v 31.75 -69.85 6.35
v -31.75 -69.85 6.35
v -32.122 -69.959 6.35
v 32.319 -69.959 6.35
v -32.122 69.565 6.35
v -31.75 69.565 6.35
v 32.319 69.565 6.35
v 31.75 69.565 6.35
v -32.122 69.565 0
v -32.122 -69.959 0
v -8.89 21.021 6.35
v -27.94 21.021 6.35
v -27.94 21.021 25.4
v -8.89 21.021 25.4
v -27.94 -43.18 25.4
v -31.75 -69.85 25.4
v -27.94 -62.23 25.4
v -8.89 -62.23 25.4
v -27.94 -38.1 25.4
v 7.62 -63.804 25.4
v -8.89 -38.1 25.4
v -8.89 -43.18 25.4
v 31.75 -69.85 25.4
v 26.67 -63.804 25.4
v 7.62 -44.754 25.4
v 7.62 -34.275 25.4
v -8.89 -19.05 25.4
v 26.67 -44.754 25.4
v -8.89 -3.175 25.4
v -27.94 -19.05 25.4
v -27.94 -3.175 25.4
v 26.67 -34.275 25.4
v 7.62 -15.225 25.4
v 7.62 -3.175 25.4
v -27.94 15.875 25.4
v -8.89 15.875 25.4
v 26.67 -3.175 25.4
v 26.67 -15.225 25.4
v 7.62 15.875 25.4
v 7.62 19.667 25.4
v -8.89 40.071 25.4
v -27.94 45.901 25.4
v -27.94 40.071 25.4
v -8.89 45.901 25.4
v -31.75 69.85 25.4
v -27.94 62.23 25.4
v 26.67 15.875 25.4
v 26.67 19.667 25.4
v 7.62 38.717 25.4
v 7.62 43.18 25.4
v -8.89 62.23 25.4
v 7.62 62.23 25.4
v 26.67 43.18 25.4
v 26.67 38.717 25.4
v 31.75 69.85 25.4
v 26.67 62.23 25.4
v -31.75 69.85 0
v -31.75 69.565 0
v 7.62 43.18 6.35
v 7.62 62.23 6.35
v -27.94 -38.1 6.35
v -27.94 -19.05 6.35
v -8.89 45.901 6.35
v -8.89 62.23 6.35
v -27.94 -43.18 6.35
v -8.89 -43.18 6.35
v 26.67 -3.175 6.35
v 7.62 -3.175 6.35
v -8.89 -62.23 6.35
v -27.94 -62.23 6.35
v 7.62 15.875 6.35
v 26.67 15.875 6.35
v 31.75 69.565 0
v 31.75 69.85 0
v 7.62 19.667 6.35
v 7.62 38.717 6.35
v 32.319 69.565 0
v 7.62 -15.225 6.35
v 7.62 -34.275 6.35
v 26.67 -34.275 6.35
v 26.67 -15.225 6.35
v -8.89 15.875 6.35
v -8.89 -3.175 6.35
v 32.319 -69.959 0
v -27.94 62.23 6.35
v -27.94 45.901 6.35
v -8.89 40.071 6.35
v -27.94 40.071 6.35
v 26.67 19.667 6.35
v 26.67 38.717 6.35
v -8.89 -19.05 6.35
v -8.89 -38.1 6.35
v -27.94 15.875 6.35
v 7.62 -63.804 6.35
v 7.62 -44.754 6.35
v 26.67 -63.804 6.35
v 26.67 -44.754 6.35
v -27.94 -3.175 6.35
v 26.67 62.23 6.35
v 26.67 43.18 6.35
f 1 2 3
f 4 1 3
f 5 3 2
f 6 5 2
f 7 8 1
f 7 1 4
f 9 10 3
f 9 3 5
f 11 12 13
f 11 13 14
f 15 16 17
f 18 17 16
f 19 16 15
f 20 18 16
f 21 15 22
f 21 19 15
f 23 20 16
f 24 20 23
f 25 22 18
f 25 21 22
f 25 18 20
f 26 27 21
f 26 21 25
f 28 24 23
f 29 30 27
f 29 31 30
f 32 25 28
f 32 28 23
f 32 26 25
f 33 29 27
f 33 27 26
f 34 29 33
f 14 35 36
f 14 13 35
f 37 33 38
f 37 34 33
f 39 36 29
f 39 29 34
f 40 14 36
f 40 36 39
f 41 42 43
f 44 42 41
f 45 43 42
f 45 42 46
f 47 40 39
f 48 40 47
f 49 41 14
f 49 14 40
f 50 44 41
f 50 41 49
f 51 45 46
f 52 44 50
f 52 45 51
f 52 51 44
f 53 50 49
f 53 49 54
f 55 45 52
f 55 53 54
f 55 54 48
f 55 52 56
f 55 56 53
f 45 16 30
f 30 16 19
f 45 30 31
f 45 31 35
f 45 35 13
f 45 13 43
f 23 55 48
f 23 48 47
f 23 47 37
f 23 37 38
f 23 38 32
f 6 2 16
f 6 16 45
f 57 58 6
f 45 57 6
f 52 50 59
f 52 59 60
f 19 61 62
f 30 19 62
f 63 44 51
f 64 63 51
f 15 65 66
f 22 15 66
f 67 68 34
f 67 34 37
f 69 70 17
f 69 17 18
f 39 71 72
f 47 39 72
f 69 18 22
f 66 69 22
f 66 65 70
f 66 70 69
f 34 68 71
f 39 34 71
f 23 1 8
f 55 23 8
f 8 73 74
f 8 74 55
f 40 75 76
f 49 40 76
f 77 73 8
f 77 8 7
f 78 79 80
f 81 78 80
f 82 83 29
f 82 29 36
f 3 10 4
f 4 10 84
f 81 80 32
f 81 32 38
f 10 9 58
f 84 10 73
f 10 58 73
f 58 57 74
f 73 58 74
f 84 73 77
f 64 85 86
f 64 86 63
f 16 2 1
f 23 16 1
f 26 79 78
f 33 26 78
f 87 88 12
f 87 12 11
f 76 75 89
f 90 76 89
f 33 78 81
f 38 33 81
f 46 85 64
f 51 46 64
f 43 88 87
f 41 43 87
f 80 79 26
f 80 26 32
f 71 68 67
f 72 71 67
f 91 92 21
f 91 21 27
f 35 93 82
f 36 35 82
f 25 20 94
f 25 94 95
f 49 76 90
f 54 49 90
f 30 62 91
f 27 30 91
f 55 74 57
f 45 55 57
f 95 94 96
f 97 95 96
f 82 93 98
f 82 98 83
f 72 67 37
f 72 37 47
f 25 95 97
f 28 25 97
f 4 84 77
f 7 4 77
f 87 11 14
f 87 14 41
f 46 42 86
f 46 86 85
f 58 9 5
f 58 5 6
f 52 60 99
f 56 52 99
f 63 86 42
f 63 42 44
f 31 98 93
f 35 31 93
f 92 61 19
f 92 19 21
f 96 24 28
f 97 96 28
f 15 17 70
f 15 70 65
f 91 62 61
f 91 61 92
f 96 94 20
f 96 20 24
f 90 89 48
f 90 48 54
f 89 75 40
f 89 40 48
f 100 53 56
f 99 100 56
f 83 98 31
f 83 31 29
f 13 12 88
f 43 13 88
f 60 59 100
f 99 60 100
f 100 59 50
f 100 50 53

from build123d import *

# Parameters (mm, degrees)
F0_W     = 27.94
F0_H     = 139.7
F0_W_2   = 19.05
F0_H_2   = 19.05
F0_H_3   = 16.3293534029
F0_W_3   = 7.62
F1_DEPTH = 25.4
F2_W     = 64.4415542483
F2_H     = 139.5248323679
F3_DEPTH = 6.35


with BuildPart() as f1:
    # F0 (on Top) → F1 (new body)
    with BuildSketch(Plane.XY):
        with Locations((-17.78, 0)):
            Rectangle(F0_W, F0_H)
        with Locations((-18.415, -52.705)):
            Rectangle(F0_W_2, F0_H_2, mode=Mode.SUBTRACT)
        with Locations((-18.415, -28.575)):
            Rectangle(F0_W_2, F0_H_2, mode=Mode.SUBTRACT)
        with Locations((-18.415, 6.35)):
            Rectangle(F0_W_2, F0_H_2, mode=Mode.SUBTRACT)
        with Locations((-18.415, 30.5456899792)):
            Rectangle(F0_W_2, F0_H_2, mode=Mode.SUBTRACT)
        with Locations((-18.415, 54.0653232986)):
            Rectangle(F0_W_2, F0_H_3, mode=Mode.SUBTRACT)
        Rectangle(F0_W_3, F0_H)
        with Locations((17.78, 0)):
            Rectangle(F0_W, F0_H)
        with Locations((17.145, -54.2791421771)):
            Rectangle(F0_W_2, F0_H_2, mode=Mode.SUBTRACT)
        with Locations((17.145, -24.7503119767)):
            Rectangle(F0_W_2, F0_H_2, mode=Mode.SUBTRACT)
        with Locations((17.145, 6.35)):
            Rectangle(F0_W_2, F0_H_2, mode=Mode.SUBTRACT)
        with Locations((17.145, 29.1921038866)):
            Rectangle(F0_W_2, F0_H_2, mode=Mode.SUBTRACT)
        with Locations((17.145, 52.705)):
            Rectangle(F0_W_2, F0_H_2, mode=Mode.SUBTRACT)
    extrude(amount=F1_DEPTH)

    # F2 (on Top) → F3 (join)
    with BuildSketch(Plane.XY):
        with Locations((0.0985339284, -0.1970678568)):
            Rectangle(F2_W, F2_H)
    extrude(amount=F3_DEPTH)


solid = f1.part
